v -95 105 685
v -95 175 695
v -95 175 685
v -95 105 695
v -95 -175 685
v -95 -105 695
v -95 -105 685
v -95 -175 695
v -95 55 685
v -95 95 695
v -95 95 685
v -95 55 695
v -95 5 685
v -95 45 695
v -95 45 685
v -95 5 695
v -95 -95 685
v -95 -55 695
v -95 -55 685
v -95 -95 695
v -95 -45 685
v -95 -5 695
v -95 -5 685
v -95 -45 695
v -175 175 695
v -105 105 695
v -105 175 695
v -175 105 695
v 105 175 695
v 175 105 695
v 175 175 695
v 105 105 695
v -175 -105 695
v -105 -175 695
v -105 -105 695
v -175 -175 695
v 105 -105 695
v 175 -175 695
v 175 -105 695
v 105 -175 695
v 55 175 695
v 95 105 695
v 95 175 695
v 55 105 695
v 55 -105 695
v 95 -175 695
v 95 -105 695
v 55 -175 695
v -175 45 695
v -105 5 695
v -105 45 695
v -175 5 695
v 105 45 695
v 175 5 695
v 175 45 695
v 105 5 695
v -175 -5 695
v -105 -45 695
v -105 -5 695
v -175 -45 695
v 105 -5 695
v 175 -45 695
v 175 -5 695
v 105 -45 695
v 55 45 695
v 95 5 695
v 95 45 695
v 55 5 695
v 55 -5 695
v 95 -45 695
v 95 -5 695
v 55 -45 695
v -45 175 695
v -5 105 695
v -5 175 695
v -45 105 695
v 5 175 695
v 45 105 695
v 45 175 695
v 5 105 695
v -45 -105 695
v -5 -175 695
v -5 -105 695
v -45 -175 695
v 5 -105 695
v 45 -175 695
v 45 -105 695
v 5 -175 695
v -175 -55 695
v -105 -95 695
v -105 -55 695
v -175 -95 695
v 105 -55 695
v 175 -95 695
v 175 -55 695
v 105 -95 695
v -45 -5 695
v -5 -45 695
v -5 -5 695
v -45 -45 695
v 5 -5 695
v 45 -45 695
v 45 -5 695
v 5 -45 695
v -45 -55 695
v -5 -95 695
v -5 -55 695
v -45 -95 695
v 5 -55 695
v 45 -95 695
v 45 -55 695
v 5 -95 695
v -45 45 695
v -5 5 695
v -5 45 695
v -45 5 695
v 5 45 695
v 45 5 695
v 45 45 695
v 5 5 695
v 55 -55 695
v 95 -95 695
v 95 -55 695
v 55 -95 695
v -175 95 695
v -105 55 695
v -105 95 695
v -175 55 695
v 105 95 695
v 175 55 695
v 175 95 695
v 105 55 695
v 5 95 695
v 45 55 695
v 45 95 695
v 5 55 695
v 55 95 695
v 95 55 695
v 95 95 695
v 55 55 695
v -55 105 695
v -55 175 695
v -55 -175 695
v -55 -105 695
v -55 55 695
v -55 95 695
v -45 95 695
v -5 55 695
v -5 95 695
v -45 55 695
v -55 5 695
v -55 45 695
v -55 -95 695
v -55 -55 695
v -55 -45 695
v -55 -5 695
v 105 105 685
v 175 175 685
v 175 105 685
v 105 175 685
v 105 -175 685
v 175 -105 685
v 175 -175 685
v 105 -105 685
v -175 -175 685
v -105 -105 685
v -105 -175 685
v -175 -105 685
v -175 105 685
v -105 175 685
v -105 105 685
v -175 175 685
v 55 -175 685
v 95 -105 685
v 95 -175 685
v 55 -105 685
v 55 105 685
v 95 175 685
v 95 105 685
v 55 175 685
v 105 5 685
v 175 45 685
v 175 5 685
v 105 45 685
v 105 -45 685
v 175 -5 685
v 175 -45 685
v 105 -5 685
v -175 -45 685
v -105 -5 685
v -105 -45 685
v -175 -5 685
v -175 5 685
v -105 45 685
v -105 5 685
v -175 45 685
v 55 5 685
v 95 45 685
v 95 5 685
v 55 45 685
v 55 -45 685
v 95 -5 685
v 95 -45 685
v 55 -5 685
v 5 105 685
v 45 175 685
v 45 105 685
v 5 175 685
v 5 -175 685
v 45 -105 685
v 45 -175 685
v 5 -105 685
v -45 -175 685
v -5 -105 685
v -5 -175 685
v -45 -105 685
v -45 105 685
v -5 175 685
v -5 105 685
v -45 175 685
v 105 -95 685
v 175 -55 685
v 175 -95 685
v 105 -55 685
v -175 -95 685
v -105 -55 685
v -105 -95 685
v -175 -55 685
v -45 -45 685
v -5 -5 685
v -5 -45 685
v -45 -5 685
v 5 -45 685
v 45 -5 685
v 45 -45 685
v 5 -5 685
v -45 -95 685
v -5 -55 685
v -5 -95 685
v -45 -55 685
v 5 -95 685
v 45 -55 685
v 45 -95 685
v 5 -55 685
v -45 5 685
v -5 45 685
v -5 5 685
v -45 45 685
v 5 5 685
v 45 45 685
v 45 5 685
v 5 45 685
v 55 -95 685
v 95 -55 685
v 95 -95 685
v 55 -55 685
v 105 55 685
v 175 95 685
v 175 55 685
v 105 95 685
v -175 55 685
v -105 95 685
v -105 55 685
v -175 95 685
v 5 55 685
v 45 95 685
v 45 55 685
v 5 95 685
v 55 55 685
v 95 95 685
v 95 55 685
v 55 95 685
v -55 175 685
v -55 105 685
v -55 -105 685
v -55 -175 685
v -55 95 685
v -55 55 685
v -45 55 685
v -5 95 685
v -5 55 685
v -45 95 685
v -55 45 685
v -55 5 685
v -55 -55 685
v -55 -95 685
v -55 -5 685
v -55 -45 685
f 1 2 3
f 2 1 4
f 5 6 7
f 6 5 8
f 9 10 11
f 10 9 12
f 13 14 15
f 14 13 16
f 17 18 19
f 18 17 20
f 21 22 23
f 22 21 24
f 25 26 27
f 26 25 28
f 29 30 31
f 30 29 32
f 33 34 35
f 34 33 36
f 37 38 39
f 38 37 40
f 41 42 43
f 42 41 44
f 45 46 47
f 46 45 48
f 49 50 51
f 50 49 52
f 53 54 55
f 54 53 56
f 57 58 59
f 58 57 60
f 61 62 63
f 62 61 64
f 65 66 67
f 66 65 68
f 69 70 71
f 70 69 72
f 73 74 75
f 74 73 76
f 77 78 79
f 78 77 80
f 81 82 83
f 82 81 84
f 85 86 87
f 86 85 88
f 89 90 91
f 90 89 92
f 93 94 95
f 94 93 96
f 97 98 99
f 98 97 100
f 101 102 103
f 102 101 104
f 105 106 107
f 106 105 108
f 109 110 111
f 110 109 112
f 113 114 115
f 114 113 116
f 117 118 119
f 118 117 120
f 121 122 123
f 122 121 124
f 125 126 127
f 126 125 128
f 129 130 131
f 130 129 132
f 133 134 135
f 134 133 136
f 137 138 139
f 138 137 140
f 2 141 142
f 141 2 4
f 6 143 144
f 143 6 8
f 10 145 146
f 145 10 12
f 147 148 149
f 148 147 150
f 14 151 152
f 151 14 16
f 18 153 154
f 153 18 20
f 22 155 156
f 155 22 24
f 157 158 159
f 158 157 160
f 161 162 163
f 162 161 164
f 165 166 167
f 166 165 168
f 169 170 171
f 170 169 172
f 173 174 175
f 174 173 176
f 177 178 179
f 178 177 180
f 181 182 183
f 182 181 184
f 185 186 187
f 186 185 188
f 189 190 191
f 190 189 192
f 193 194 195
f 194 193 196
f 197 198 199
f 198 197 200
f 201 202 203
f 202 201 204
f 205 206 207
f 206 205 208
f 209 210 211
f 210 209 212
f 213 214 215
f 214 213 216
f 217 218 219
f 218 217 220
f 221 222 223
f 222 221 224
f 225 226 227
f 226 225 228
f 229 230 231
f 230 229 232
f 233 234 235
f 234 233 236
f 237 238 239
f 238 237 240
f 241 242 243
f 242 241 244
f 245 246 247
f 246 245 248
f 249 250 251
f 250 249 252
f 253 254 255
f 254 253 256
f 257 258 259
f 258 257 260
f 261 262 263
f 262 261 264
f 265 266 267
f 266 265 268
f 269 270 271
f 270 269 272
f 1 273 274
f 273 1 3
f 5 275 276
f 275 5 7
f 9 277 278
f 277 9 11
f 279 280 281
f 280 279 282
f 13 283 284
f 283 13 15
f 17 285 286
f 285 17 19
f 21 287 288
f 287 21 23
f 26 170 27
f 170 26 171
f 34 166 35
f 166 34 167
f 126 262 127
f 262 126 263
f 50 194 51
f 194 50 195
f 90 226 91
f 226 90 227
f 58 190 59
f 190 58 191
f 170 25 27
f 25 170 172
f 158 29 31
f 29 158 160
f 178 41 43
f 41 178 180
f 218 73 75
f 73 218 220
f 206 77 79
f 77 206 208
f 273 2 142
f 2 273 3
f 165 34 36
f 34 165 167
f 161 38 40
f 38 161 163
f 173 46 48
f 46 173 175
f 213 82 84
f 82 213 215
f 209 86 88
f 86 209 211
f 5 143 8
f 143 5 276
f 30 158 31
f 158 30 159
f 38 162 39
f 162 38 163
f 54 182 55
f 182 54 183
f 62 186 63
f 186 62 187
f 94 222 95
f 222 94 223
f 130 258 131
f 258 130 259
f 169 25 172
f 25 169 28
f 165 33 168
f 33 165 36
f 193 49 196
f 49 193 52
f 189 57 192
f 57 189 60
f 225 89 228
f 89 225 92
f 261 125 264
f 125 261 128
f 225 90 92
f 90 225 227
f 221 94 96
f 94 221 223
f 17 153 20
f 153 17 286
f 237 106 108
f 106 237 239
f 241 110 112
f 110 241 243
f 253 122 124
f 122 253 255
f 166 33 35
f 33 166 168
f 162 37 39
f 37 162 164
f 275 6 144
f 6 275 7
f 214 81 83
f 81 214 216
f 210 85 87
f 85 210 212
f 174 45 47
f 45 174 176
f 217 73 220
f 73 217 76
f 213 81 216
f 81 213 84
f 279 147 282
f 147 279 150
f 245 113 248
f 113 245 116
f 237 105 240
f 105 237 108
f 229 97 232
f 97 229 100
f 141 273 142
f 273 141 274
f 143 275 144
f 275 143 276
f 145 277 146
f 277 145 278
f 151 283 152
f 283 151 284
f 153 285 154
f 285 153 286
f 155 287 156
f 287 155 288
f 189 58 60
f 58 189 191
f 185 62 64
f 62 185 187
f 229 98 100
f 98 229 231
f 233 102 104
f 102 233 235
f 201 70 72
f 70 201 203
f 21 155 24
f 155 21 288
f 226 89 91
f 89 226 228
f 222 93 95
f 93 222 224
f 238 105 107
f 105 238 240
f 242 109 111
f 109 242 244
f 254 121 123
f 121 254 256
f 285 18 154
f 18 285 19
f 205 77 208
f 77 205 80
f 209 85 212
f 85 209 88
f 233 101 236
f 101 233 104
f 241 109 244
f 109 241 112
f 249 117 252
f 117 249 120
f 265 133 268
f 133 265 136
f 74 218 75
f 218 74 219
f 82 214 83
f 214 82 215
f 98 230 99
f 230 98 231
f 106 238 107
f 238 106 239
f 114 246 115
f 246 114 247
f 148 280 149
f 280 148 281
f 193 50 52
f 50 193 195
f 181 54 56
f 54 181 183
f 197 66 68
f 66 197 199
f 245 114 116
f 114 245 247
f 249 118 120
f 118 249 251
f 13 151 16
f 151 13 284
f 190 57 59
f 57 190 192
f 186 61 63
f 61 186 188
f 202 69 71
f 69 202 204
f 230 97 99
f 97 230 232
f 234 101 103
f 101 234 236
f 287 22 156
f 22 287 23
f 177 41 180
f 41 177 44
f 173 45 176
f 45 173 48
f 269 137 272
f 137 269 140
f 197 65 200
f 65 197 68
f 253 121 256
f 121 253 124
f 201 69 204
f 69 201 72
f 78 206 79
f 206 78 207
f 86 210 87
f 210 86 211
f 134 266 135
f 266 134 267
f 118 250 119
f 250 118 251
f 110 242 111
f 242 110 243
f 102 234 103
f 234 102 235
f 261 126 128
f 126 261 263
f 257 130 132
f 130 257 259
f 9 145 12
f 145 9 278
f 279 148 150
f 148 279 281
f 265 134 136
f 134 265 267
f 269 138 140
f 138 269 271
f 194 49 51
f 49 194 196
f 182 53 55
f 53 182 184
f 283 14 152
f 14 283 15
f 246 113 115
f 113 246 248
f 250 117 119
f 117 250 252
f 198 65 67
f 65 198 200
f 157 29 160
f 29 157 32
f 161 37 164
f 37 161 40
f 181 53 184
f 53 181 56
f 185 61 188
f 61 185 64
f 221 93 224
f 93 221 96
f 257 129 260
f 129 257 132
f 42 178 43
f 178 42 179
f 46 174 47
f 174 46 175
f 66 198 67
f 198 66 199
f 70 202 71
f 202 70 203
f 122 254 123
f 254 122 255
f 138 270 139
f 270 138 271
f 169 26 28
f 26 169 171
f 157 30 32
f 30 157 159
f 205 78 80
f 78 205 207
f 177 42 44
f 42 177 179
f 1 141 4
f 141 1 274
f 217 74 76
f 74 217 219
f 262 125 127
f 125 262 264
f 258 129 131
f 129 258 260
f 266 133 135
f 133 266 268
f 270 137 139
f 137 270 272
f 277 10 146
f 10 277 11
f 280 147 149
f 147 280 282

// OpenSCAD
// OpenSCAD file
// Top of the cage
difference() {
  translate([0, 0, 690]) cube([350, 350, 10], center = true);
  for (i = [-2:2]) {
    translate([i * 50, 0, 690]) cube([10, 350, 10], center = true);
    translate([0, i * 50, 690]) cube([350, 10, 10], center = true);
  }
  translate([0, 0, 695]) cylinder(h = 10, r = 3, $fn = 100);
}
